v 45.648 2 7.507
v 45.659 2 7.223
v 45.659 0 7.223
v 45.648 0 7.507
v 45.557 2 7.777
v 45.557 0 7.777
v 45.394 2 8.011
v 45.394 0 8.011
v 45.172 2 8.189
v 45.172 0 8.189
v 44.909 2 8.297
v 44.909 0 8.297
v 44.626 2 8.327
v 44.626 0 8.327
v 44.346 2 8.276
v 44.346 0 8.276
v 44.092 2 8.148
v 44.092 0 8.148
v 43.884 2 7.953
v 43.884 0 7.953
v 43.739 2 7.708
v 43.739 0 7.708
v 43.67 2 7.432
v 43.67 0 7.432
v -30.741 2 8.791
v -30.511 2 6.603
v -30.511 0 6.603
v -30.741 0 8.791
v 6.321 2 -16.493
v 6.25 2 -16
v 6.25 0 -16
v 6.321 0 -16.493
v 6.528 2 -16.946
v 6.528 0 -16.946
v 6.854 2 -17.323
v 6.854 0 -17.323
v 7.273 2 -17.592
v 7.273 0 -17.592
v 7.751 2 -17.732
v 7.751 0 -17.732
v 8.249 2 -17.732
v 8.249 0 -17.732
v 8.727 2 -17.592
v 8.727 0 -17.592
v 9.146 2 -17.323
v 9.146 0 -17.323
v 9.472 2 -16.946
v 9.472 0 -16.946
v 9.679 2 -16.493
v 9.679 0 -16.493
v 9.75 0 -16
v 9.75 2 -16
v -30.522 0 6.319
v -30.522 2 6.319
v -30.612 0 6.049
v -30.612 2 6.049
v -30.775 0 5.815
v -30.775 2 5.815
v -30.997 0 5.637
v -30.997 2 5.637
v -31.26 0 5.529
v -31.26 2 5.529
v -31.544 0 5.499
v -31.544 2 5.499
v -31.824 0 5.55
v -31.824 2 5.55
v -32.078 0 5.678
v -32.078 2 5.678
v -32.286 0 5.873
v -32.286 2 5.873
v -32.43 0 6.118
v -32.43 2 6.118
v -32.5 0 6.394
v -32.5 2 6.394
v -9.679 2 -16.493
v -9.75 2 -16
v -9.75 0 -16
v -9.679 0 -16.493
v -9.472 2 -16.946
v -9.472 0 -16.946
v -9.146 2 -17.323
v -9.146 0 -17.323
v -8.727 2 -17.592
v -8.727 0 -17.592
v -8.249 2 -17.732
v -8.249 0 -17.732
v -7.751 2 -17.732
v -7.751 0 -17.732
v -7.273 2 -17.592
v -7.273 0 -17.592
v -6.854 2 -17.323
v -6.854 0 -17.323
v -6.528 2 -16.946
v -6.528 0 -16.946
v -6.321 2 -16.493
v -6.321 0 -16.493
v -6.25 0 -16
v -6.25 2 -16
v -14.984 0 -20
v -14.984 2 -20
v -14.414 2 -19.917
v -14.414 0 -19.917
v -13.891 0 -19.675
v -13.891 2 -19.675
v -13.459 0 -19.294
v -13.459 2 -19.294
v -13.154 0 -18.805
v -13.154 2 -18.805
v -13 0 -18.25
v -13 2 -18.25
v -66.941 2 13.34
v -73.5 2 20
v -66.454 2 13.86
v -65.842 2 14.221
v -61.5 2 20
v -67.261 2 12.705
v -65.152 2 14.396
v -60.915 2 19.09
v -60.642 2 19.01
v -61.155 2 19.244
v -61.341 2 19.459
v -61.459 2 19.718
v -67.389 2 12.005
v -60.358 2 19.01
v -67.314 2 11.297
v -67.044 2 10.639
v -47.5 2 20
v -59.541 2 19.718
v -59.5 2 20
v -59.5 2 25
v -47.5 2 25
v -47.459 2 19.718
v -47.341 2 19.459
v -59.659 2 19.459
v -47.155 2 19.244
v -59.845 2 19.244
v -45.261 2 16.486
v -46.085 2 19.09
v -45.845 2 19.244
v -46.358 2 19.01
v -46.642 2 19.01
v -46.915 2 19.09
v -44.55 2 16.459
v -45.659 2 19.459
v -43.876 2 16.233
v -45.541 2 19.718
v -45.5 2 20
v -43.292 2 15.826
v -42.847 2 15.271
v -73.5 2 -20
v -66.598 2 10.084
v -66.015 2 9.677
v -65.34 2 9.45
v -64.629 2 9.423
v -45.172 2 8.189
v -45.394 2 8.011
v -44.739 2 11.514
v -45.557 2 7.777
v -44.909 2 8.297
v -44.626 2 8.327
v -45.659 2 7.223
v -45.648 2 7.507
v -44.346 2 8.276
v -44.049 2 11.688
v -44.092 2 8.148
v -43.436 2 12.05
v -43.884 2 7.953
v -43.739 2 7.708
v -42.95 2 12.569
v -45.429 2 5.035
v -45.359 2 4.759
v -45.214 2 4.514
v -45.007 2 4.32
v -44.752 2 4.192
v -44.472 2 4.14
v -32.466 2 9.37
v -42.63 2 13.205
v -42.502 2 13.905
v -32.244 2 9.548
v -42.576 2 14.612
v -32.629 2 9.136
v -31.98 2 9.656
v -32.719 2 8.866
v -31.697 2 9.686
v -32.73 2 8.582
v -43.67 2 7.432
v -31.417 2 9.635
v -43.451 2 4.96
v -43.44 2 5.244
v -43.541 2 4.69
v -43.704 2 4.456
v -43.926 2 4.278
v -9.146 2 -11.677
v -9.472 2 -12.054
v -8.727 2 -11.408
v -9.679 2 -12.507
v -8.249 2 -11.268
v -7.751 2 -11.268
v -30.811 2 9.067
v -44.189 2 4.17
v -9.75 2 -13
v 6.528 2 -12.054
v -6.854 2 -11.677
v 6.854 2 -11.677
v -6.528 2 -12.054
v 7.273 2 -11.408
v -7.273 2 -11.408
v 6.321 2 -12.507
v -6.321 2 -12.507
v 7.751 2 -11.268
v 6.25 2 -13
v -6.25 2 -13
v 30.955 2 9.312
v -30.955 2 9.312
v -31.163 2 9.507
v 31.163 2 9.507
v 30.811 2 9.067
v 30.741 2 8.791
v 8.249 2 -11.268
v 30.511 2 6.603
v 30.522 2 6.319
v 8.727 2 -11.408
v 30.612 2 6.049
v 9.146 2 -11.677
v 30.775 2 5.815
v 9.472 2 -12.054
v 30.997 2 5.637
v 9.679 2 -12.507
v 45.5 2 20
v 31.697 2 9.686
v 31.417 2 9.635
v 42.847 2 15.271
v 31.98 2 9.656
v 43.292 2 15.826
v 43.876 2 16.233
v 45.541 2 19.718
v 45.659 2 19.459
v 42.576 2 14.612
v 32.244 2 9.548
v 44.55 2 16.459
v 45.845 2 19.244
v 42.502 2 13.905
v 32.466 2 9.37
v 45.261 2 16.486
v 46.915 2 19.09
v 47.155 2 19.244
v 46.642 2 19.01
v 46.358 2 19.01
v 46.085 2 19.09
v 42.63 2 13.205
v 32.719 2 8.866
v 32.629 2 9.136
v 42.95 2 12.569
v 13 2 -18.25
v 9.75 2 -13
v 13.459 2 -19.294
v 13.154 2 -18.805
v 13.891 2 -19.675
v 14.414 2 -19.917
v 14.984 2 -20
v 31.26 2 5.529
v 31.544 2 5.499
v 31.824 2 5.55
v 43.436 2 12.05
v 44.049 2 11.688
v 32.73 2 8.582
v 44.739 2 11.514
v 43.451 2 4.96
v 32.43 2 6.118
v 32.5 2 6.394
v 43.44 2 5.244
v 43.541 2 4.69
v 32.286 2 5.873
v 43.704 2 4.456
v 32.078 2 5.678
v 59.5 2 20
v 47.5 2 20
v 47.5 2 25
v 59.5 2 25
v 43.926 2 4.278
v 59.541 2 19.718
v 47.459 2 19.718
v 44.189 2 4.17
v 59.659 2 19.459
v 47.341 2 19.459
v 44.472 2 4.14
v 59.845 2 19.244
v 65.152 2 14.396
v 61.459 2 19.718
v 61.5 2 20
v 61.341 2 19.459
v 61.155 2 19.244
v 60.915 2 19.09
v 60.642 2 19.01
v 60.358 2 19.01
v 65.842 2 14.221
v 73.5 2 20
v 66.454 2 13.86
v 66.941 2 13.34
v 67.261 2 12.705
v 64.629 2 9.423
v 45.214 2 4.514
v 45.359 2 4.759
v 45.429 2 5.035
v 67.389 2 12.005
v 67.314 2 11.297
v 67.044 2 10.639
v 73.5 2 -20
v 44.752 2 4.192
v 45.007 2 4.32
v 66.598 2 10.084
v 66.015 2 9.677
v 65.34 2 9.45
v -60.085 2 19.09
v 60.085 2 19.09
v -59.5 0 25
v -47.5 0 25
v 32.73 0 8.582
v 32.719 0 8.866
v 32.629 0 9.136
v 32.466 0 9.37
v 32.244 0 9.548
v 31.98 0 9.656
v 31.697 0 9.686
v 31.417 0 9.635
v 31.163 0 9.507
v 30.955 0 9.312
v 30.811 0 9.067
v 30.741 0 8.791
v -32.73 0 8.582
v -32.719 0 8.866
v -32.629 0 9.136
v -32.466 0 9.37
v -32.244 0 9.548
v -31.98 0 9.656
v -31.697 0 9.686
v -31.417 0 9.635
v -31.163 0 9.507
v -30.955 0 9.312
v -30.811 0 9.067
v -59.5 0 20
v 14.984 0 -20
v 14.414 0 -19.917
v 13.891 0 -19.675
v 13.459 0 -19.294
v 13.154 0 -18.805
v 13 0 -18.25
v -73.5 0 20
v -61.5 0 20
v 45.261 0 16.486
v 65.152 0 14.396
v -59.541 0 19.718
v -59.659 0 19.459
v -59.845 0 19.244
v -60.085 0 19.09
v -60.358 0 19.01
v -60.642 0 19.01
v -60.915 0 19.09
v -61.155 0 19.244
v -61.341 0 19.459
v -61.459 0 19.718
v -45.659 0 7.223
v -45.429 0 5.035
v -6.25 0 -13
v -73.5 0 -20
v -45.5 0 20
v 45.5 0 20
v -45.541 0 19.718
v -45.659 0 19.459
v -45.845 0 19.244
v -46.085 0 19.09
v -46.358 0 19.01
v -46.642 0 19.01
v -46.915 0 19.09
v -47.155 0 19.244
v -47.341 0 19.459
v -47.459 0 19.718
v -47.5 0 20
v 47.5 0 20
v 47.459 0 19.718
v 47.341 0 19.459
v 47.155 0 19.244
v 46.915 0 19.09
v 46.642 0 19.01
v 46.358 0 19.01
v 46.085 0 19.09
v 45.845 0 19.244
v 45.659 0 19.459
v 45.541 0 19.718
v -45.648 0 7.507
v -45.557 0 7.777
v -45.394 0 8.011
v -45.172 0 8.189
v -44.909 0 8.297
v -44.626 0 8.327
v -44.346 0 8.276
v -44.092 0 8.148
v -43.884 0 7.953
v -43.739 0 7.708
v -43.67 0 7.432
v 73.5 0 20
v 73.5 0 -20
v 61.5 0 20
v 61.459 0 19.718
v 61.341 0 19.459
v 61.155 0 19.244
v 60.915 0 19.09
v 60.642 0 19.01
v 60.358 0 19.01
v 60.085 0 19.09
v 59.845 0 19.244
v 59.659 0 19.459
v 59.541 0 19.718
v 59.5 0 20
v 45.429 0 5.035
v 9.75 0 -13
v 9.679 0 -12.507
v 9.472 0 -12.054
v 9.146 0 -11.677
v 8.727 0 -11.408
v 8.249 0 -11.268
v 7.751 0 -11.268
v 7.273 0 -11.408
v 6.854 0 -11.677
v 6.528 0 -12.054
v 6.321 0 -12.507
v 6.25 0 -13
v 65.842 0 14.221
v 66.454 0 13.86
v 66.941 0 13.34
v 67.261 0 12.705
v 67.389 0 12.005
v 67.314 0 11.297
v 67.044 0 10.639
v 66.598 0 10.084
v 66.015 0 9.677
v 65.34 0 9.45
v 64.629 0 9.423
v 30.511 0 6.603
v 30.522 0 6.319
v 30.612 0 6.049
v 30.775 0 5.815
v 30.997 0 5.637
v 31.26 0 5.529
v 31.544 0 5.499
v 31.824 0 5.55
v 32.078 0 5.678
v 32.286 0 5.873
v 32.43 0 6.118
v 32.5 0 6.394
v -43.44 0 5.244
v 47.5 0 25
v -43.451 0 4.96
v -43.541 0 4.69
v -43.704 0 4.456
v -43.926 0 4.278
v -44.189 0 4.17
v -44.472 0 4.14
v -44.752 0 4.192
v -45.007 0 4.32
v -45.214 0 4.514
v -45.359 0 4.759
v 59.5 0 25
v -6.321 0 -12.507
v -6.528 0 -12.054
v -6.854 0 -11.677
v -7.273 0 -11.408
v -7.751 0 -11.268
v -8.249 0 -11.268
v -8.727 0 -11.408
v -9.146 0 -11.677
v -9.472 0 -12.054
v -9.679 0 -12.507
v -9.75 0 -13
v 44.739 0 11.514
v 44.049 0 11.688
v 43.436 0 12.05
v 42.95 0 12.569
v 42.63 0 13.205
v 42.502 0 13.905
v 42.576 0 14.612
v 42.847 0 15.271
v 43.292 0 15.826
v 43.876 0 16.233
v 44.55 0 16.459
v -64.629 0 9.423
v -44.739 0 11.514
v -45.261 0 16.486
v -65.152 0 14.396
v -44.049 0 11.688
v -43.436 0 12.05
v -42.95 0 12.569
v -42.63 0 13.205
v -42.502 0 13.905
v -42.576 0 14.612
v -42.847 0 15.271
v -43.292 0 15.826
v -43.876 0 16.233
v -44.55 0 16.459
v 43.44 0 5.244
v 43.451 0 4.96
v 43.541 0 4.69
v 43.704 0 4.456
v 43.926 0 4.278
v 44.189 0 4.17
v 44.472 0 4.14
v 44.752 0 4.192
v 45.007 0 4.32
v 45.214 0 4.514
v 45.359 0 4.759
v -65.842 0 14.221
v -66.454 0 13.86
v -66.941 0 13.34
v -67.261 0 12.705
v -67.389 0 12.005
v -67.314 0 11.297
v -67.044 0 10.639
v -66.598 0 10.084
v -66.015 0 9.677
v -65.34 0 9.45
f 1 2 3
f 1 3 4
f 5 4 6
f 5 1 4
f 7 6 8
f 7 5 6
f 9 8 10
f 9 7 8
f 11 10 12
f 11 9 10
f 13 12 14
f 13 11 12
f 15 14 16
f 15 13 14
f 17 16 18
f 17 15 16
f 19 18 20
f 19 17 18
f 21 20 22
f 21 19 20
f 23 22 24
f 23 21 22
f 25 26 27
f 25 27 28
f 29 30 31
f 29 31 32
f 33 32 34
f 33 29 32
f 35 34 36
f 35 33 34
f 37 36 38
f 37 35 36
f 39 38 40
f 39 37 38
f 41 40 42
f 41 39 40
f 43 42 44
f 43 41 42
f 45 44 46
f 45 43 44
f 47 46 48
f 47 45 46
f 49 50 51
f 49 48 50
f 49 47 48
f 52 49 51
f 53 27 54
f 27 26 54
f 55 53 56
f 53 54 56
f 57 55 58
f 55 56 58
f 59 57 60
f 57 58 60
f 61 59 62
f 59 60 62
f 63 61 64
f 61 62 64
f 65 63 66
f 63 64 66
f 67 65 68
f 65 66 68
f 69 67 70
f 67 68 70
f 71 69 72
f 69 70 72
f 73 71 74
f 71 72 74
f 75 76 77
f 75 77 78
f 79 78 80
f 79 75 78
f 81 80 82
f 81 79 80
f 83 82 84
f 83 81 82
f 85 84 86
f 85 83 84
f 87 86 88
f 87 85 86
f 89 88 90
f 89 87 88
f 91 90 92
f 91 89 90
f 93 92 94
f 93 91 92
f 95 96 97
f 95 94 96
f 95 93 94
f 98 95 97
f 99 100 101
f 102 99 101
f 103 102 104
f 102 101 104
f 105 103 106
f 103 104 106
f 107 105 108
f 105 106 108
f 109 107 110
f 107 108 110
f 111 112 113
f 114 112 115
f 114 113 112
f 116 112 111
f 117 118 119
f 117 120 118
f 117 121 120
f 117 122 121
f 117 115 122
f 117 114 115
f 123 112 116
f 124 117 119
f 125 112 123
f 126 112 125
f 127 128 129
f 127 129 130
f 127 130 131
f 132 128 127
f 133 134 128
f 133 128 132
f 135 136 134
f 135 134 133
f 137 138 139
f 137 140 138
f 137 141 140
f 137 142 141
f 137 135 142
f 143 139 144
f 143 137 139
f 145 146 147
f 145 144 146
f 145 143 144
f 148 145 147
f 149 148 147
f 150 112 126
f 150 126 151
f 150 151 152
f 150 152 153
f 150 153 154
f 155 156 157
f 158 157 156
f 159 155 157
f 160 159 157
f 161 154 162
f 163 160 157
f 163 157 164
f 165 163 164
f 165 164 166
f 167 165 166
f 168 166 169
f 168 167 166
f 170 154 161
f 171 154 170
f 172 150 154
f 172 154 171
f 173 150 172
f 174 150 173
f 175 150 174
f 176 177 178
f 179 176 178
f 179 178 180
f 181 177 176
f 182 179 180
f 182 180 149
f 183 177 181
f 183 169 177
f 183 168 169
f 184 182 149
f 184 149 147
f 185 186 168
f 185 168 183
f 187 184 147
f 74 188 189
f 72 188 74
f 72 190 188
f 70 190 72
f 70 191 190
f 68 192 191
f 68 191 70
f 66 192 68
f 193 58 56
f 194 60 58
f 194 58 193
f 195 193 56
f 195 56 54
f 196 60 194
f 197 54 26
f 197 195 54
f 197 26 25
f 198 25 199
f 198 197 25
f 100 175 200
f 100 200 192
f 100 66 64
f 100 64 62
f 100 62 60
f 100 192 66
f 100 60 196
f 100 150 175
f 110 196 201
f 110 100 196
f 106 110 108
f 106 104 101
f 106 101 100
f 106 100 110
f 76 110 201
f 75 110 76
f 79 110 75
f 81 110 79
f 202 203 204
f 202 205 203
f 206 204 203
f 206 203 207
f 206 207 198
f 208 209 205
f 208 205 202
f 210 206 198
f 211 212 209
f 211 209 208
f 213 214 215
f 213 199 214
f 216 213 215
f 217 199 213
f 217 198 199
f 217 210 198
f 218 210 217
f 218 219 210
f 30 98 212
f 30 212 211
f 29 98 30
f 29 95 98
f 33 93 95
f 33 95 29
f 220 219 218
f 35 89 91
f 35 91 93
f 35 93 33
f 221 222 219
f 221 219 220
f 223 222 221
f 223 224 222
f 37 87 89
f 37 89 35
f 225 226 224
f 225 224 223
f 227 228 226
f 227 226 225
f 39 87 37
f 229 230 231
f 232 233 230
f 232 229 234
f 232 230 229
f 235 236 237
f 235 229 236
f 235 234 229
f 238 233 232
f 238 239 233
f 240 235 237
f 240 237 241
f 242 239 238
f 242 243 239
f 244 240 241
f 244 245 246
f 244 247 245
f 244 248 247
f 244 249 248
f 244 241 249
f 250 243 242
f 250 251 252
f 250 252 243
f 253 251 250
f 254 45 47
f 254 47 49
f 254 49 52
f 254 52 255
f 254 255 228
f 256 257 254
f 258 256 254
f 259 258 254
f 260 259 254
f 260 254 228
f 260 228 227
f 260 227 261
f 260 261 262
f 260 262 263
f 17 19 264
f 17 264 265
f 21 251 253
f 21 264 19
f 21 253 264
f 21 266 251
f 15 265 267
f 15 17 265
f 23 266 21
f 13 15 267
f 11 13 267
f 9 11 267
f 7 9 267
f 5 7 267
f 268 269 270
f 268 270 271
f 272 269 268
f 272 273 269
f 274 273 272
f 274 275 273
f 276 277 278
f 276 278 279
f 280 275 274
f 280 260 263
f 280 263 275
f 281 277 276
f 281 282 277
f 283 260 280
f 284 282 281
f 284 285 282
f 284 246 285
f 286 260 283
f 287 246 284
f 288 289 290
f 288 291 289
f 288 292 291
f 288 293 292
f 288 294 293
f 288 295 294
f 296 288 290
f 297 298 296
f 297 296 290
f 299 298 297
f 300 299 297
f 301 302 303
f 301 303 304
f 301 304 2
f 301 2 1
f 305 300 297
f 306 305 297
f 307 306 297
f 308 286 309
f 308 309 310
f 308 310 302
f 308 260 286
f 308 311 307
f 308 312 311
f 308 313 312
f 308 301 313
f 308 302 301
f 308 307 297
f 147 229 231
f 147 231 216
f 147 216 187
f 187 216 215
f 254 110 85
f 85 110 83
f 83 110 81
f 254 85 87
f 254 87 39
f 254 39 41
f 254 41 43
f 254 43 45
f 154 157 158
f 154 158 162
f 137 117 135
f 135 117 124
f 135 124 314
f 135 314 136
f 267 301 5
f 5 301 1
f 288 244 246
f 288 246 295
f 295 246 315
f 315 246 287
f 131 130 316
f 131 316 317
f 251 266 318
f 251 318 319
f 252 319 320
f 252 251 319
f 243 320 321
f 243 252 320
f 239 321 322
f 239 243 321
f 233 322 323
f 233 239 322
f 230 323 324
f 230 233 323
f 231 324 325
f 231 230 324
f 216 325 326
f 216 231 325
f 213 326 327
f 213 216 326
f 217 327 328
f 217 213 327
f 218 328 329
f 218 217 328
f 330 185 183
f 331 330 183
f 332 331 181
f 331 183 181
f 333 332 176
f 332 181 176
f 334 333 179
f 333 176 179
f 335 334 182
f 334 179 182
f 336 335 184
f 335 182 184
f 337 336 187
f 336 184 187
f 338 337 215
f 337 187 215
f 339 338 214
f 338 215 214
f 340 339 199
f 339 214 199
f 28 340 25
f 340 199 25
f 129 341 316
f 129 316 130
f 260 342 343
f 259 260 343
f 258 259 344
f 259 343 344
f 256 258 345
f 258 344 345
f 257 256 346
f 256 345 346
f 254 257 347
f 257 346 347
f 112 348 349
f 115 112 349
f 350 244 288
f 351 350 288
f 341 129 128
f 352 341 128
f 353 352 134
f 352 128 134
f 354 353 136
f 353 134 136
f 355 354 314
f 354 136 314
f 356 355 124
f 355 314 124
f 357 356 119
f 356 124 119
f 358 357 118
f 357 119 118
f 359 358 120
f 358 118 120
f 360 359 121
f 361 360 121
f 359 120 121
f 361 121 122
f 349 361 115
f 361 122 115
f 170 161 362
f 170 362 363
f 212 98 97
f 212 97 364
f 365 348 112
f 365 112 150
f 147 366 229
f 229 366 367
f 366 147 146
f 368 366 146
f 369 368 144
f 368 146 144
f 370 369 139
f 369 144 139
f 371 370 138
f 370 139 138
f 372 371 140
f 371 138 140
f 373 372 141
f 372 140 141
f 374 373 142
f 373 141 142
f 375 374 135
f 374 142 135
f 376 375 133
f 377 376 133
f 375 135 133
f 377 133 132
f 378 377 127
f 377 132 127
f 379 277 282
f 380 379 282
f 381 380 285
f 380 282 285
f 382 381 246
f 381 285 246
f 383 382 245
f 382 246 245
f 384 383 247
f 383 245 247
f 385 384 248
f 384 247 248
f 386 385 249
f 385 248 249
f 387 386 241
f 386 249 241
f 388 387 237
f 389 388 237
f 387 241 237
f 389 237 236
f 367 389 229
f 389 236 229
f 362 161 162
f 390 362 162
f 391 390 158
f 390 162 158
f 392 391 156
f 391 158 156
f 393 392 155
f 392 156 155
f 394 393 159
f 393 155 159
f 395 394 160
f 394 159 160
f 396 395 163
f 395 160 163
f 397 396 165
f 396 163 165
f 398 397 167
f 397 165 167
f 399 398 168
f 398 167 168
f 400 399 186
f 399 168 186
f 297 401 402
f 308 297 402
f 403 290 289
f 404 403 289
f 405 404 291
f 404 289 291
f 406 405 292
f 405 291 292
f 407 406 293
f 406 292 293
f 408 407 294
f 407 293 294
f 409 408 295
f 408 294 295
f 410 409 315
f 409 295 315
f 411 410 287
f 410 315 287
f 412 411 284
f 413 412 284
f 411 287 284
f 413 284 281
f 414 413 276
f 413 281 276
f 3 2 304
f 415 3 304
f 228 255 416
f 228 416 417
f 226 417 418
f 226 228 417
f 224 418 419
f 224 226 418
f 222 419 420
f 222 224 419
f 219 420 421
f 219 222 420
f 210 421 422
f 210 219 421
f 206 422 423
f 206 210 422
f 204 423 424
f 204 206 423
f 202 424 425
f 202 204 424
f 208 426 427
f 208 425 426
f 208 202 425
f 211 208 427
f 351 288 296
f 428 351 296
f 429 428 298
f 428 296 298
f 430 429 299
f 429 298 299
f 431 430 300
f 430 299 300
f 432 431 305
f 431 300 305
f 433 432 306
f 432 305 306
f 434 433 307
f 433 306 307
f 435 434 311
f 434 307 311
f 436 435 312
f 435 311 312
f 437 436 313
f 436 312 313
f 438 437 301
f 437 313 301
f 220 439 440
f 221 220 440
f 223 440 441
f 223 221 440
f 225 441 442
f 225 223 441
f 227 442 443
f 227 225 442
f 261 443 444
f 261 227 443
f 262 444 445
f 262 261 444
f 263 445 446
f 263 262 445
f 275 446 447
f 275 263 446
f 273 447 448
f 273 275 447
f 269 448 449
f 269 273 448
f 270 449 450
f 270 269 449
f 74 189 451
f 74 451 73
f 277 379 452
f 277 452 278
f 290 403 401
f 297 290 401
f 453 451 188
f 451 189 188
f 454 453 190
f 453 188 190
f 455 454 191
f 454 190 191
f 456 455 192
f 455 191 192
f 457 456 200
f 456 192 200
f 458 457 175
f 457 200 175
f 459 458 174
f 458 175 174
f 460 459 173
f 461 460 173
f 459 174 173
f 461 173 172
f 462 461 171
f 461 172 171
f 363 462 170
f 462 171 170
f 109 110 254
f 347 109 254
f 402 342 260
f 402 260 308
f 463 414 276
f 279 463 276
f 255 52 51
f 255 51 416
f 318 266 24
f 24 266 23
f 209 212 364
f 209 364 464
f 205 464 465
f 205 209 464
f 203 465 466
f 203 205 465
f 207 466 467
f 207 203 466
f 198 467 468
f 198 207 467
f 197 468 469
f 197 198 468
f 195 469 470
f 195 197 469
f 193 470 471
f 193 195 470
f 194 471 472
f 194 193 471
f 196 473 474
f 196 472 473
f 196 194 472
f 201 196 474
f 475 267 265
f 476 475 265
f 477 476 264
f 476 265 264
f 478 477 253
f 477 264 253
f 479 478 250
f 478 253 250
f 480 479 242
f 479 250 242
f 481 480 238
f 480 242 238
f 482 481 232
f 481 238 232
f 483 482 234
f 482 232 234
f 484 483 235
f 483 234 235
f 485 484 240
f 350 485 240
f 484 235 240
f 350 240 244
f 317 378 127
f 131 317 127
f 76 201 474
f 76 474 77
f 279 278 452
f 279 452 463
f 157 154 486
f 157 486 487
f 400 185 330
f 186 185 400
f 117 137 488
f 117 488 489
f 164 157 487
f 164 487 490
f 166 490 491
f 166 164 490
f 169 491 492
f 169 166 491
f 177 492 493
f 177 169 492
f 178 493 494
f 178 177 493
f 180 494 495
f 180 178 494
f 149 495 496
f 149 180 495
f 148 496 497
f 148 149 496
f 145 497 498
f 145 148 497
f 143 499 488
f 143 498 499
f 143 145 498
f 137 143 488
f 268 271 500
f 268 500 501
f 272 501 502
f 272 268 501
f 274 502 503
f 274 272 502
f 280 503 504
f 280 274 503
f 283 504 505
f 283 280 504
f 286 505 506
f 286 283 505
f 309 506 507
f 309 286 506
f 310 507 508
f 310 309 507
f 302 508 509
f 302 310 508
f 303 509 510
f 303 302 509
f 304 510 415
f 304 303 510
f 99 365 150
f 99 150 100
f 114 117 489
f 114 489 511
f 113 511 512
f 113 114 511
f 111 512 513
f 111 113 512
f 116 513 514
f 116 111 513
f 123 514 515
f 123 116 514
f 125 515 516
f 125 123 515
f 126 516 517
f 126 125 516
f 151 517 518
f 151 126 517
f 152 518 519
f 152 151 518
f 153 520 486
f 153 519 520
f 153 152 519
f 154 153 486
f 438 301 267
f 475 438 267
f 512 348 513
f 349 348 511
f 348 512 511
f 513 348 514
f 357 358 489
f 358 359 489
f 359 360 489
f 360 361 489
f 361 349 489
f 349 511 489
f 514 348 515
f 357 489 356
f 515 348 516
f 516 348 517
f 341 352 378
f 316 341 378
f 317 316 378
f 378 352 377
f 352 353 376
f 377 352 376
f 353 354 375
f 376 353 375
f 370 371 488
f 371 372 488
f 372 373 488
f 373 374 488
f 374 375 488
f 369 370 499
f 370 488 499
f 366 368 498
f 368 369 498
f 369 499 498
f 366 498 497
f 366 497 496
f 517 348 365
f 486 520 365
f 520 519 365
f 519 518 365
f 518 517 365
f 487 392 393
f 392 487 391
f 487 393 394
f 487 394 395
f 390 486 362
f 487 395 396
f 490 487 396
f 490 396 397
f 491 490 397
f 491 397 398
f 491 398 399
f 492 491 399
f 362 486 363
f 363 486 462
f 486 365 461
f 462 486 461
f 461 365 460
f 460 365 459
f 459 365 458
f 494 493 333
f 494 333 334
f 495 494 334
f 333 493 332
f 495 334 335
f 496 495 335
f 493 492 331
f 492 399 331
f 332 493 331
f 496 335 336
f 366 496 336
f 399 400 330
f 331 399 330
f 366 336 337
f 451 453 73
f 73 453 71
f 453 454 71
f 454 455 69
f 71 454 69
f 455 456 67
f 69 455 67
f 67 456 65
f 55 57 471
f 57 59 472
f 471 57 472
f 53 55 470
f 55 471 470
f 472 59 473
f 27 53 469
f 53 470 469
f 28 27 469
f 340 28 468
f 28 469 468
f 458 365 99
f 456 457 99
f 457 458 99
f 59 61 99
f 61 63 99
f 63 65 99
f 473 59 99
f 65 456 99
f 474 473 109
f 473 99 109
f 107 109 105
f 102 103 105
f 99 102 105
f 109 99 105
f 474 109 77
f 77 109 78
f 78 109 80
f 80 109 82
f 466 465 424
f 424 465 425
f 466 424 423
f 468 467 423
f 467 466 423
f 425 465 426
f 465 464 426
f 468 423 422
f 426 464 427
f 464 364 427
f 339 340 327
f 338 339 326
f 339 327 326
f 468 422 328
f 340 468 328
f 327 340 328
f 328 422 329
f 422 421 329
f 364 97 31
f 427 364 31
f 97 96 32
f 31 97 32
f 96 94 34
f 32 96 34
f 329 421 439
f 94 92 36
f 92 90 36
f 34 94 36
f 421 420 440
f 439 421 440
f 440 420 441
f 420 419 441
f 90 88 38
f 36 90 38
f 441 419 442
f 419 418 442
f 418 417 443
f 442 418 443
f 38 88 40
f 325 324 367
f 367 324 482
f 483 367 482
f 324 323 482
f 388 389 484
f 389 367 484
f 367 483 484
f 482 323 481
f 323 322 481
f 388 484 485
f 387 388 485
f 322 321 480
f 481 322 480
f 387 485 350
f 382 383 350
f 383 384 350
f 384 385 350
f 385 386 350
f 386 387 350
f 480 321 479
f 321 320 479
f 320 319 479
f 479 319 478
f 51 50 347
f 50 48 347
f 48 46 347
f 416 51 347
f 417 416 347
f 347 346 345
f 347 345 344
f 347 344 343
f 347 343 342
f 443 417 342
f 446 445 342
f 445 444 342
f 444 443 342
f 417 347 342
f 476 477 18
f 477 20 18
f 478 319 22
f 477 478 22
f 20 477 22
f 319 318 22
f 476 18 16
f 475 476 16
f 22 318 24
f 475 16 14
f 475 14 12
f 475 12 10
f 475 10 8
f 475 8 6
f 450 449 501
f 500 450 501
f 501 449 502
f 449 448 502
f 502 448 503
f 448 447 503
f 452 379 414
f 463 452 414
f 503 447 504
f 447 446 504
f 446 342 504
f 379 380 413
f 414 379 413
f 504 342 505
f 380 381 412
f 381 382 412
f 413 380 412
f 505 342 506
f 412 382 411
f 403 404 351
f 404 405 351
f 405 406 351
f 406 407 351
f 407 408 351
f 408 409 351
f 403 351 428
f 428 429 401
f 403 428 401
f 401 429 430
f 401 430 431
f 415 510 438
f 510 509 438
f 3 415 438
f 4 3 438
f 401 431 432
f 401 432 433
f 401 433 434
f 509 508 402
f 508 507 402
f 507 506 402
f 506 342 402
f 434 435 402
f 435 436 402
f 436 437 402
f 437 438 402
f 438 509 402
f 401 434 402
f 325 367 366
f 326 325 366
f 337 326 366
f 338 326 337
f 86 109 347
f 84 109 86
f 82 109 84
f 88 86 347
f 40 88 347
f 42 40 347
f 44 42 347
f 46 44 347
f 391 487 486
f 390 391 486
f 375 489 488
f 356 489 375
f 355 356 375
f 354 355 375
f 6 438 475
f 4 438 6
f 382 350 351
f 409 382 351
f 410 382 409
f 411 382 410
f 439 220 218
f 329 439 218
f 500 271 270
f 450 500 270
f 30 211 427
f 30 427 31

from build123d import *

# Parameters (mm, degrees)
SKETCH_1_W          = 147
SKETCH_1_H          = 40
EXTRUDE_1_DEPTH     = 2
CUT_EXTRUDE_1_DEPTH = 77.198753271
SKETCH_3_R          = 1
CUT_EXTRUDE_2_DEPTH = 77.198753271
SKETCH_5_W          = 12
SKETCH_5_H          = 2
EXTRUDE_2_DEPTH     = 5
SKETCH_7_R          = 1
CUT_EXTRUDE_3_DEPTH = 78.661122835
CUT_EXTRUDE_5_DEPTH = 78.661122835
SKETCH_11_W         = 26
SKETCH_11_H         = 3.5
CUT_EXTRUDE_6_DEPTH = 10
FILLET_1_R          = 2
CUT_EXTRUDE_7_DEPTH = 78.661122835


with BuildPart() as part:
    # 草图1 → 凸台-拉伸1 (new body)
    with BuildSketch(Plane(origin=(0, 0, 0), x_dir=(1, 0, 0), z_dir=(0, 1, 0))):
        Rectangle(SKETCH_1_W, SKETCH_1_H)
    extrude(amount=EXTRUDE_1_DEPTH)

    # 草图2 → 切除-拉伸1 (cut, through all)
    with BuildSketch(Plane(origin=(0, 2, 0), x_dir=(1, 0, 0), z_dir=(0, 1, 0))):
        Polygon((-45.658720859, -7.223049229), (-45.42875824, -5.035101059), (-30.51092981, -6.603028008), (-30.740892429, -8.790976178), align=None)
    cut_extrude_1 = extrude(amount=-CUT_EXTRUDE_1_DEPTH, mode=Mode.SUBTRACT)

    # 草图3 → 切除-拉伸2 (cut, through all)
    with BuildSketch(Plane(origin=(0, 2, 0), x_dir=(1, 0, 0), z_dir=(0, 1, 0))):
        with Locations((-44.434236345, -5.139629522)):
            Circle(SKETCH_3_R)
        with Locations((-44.664198964, -7.327577692)):
            Circle(SKETCH_3_R)
        with Locations((-31.505451705, -6.498499545)):
            Circle(SKETCH_3_R)
        with Locations((-31.735414324, -8.686447714)):
            Circle(SKETCH_3_R)
    cut_extrude_2 = extrude(amount=-CUT_EXTRUDE_2_DEPTH, mode=Mode.SUBTRACT)

    # 镜向1: 切除-拉伸1, 切除-拉伸2 across plane
    add(cut_extrude_1.mirror(Plane(origin=(0, 0, 0), x_dir=(0, 0, 1), z_dir=(1, 0, 0))), mode=Mode.SUBTRACT)
    add(cut_extrude_2.mirror(Plane(origin=(0, 0, 0), x_dir=(0, 0, 1), z_dir=(1, 0, 0))), mode=Mode.SUBTRACT)

    # 草图5 → 凸台-拉伸2 (add)
    with BuildSketch(Plane.XY.offset(20)):
        with Locations((53.5, 1)):
            Rectangle(SKETCH_5_W, SKETCH_5_H)
        with Locations((-53.5, 1)):
            Rectangle(SKETCH_5_W, SKETCH_5_H)
    extrude(amount=EXTRUDE_2_DEPTH)

    # 草图7 → 切除-拉伸3 (cut, through all)
    with BuildSketch(Plane(origin=(0, 2, 0), x_dir=(1, 0, 0), z_dir=(0, 1, 0))):
        with Locations((60.5, -20)):
            Circle(SKETCH_7_R)
        with Locations((46.5, -20)):
            Circle(SKETCH_7_R)
        with Locations((-46.5, -20)):
            Circle(SKETCH_7_R)
        with Locations((-60.5, -20)):
            Circle(SKETCH_7_R)
    extrude(amount=-CUT_EXTRUDE_3_DEPTH, mode=Mode.SUBTRACT)

    # 草图10 → 切除-拉伸5 (cut, through all)
    with BuildSketch(Plane(origin=(0, 2, 0), x_dir=(1, 0, 0), z_dir=(0, 1, 0))):
        with BuildLine():
            Line((-64.629116749, -9.423125996), (-44.738678842, -11.513695262))
            ThreePointArc((-44.738678842, -11.513695262), (-42.513695262, -14.261321158), (-45.261321158, -16.486304738))
            Line((-45.261321158, -16.486304738), (-65.151759066, -14.395735473))
            ThreePointArc((-65.151759066, -14.395735473), (-67.376742646, -11.648109576), (-64.629116749, -9.423125996))
        make_face()
    cut_extrude_5 = extrude(amount=-CUT_EXTRUDE_5_DEPTH, mode=Mode.SUBTRACT)

    # 镜向2: 切除-拉伸5 across plane
    add(cut_extrude_5.mirror(Plane(origin=(0, 0, 0), x_dir=(0, 0, 1), z_dir=(1, 0, 0))), mode=Mode.SUBTRACT)

    # 草图11 → 切除-拉伸6 (cut)
    with BuildSketch(Plane(origin=(0, 2, 0), x_dir=(1, 0, 0), z_dir=(0, 1, 0))):
        with Locations((0, 20)):
            Rectangle(SKETCH_11_W, SKETCH_11_H)
    extrude(amount=-CUT_EXTRUDE_6_DEPTH, mode=Mode.SUBTRACT)

    # 圆角1
    # the kernel refuses this fillet: 2 mm, written as the material it takes off along each edge
    with BuildSketch(Plane(origin=(13, -4.960783708, -20), x_dir=(1, 0, 0), z_dir=(0, 1, 0)), Plane(origin=(-13, 6.960783708, -20), x_dir=(-1, 0, 0), z_dir=(0, -1, 0))) as fillet_1_piece_1:
        with BuildLine():
            CenterArc((1.984313483, -2), FILLET_1_R, 90, 82.819244219)
            Line((0, -1.75), (-0.03968627, -1.745))
            ThreePointArc((-0.03968627, -1.745), (-0.04, -0.875), (-0.04, 0))
            Line((-0.04, 0), (0, 0.04))
            Line((0, 0.04), (1.984313483, 0.04))
            Line((1.984313483, 0.04), (1.984313483, 0))
        make_face()
    extrude(amount=11.921567416, mode=Mode.SUBTRACT)

    # 草图12 → 切除-拉伸7 (cut, through all)
    with BuildSketch(Plane(origin=(0, 2, 0), x_dir=(1, 0, 0), z_dir=(0, 1, 0))):
        with BuildLine():
            Line((-6.25, 16), (-6.25, 13))
            ThreePointArc((-6.25, 13), (-8, 11.25), (-9.75, 13))
            Line((-9.75, 13), (-9.75, 16))
            ThreePointArc((-9.75, 16), (-8, 17.75), (-6.25, 16))
        make_face()
        with BuildLine():
            Line((9.75, 16), (9.75, 13))
            ThreePointArc((9.75, 13), (8, 11.25), (6.25, 13))
            Line((6.25, 13), (6.25, 16))
            ThreePointArc((6.25, 16), (8, 17.75), (9.75, 16))
        make_face()
    extrude(amount=-CUT_EXTRUDE_7_DEPTH, mode=Mode.SUBTRACT)


solid = part.part
